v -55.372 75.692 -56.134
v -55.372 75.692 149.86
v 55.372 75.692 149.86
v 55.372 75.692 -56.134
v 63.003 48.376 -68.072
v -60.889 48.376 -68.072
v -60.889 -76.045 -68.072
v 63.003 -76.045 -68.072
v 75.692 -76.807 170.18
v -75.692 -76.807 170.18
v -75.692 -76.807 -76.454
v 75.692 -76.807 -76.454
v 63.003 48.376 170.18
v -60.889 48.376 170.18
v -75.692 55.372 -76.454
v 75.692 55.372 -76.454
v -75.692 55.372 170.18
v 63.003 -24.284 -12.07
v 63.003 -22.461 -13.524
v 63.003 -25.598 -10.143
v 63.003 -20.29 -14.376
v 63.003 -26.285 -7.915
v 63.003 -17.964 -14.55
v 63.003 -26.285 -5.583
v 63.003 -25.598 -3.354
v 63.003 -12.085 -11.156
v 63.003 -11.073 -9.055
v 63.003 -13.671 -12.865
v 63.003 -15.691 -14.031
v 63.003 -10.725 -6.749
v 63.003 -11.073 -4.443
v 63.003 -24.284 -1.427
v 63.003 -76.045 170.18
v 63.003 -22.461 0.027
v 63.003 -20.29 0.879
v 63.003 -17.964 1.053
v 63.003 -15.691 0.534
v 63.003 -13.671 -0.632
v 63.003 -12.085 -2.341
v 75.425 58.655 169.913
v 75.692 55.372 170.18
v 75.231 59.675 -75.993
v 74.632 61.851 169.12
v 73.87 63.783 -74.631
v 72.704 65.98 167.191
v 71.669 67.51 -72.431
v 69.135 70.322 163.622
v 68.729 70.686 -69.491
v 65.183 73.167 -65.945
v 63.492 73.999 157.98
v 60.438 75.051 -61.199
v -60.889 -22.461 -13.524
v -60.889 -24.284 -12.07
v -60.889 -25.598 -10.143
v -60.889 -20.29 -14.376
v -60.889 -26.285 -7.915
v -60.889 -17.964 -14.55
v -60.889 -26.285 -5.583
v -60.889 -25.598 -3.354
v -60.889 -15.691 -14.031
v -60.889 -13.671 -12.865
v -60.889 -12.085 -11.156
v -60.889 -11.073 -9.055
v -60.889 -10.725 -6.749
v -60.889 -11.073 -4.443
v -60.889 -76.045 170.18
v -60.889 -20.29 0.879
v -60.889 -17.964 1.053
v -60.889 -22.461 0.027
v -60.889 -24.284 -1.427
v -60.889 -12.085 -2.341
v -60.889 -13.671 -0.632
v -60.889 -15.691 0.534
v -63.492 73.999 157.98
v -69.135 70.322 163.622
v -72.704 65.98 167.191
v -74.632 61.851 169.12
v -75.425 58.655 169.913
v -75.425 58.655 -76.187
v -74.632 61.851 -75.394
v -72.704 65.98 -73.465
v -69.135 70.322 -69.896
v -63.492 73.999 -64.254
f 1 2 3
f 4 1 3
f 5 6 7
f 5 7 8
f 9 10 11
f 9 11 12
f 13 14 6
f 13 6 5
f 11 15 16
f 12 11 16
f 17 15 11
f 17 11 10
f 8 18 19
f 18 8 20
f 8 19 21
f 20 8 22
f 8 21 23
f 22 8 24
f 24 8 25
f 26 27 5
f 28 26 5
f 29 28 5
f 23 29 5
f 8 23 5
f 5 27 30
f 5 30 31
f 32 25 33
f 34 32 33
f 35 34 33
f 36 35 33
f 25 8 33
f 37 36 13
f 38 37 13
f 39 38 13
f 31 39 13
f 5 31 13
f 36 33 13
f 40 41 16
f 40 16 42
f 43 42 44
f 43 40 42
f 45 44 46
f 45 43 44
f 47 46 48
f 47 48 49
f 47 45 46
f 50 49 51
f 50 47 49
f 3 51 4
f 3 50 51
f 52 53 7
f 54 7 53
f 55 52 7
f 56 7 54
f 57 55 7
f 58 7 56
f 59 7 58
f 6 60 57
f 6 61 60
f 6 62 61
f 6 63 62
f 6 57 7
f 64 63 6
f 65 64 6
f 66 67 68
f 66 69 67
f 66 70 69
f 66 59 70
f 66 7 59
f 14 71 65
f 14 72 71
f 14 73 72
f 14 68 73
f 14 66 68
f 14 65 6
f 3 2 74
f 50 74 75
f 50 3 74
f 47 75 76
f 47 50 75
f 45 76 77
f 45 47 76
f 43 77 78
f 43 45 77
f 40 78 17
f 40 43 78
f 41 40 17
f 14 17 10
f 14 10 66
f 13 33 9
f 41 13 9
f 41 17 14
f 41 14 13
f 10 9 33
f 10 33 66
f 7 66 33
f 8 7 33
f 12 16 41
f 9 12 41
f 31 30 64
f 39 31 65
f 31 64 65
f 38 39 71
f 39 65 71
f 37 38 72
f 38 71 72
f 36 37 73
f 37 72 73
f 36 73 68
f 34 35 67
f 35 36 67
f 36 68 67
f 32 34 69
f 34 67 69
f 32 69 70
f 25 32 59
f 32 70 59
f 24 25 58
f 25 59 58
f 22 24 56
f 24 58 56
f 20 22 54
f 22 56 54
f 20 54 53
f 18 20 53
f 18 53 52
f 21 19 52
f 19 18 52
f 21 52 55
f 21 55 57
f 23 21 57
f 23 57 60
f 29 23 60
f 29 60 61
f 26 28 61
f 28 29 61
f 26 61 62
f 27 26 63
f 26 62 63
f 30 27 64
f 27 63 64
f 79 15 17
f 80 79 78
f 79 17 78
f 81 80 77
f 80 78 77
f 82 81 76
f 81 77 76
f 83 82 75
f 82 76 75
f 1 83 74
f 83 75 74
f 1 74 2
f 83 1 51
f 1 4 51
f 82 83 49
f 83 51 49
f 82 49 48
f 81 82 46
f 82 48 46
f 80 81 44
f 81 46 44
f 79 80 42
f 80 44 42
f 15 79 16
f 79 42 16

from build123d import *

# Parameters (mm, degrees)
F1_W     = 151.38457
F1_H     = 151.737027
F2_DEPTH = 246.634
F3_R     = 20.32
F4_W     = 123.892136
F4_H     = 124.420833
F5_DEPTH = 238.252
F6_W     = 151.38457
F6_H     = 246.634
F7_DEPTH = 0.762
F8_R     = 7.823659
F9_DEPTH = 130.302


with BuildPart() as f2:
    # F1 (on offset) → F2 (new body)
    with BuildSketch(Plane.XY.offset(-76.454)):
        with Locations((4e-06, -0.176233)):
            Rectangle(F1_W, F1_H)
    extrude(amount=F2_DEPTH)

    # F3
    f3_edges = [f2.edges().sort_by_distance(p)[0] for p in [
        (4e-06, 75.692281, 170.18),
        (75.692289, 75.692281, 46.863),
        (4e-06, 75.692281, -76.454),
        (-75.692281, 75.692281, 46.863),
    ]]
    fillet(f3_edges, radius=F3_R)

    # F4 (on face) → F5 (cut)
    with BuildSketch(Plane.XY.offset(170.18)):
        with Locations((1.057398, -13.83433)):
            Rectangle(F4_W, F4_H)
    extrude(amount=-F5_DEPTH, mode=Mode.SUBTRACT)

    # F6 (on face) → F7 (join)
    with BuildSketch(Plane.XZ.offset(76.044746)):
        with Locations((4e-06, 46.863)):
            Rectangle(F6_W, F6_H)
    extrude(amount=F7_DEPTH)

    # F8 (on face) → F9 (join)
    with BuildSketch(Plane.YZ.offset(-60.88867)):
        with Locations((-18.548923, -6.748606)):
            Circle(F8_R)
    extrude(amount=F9_DEPTH)


solid = f2.part
